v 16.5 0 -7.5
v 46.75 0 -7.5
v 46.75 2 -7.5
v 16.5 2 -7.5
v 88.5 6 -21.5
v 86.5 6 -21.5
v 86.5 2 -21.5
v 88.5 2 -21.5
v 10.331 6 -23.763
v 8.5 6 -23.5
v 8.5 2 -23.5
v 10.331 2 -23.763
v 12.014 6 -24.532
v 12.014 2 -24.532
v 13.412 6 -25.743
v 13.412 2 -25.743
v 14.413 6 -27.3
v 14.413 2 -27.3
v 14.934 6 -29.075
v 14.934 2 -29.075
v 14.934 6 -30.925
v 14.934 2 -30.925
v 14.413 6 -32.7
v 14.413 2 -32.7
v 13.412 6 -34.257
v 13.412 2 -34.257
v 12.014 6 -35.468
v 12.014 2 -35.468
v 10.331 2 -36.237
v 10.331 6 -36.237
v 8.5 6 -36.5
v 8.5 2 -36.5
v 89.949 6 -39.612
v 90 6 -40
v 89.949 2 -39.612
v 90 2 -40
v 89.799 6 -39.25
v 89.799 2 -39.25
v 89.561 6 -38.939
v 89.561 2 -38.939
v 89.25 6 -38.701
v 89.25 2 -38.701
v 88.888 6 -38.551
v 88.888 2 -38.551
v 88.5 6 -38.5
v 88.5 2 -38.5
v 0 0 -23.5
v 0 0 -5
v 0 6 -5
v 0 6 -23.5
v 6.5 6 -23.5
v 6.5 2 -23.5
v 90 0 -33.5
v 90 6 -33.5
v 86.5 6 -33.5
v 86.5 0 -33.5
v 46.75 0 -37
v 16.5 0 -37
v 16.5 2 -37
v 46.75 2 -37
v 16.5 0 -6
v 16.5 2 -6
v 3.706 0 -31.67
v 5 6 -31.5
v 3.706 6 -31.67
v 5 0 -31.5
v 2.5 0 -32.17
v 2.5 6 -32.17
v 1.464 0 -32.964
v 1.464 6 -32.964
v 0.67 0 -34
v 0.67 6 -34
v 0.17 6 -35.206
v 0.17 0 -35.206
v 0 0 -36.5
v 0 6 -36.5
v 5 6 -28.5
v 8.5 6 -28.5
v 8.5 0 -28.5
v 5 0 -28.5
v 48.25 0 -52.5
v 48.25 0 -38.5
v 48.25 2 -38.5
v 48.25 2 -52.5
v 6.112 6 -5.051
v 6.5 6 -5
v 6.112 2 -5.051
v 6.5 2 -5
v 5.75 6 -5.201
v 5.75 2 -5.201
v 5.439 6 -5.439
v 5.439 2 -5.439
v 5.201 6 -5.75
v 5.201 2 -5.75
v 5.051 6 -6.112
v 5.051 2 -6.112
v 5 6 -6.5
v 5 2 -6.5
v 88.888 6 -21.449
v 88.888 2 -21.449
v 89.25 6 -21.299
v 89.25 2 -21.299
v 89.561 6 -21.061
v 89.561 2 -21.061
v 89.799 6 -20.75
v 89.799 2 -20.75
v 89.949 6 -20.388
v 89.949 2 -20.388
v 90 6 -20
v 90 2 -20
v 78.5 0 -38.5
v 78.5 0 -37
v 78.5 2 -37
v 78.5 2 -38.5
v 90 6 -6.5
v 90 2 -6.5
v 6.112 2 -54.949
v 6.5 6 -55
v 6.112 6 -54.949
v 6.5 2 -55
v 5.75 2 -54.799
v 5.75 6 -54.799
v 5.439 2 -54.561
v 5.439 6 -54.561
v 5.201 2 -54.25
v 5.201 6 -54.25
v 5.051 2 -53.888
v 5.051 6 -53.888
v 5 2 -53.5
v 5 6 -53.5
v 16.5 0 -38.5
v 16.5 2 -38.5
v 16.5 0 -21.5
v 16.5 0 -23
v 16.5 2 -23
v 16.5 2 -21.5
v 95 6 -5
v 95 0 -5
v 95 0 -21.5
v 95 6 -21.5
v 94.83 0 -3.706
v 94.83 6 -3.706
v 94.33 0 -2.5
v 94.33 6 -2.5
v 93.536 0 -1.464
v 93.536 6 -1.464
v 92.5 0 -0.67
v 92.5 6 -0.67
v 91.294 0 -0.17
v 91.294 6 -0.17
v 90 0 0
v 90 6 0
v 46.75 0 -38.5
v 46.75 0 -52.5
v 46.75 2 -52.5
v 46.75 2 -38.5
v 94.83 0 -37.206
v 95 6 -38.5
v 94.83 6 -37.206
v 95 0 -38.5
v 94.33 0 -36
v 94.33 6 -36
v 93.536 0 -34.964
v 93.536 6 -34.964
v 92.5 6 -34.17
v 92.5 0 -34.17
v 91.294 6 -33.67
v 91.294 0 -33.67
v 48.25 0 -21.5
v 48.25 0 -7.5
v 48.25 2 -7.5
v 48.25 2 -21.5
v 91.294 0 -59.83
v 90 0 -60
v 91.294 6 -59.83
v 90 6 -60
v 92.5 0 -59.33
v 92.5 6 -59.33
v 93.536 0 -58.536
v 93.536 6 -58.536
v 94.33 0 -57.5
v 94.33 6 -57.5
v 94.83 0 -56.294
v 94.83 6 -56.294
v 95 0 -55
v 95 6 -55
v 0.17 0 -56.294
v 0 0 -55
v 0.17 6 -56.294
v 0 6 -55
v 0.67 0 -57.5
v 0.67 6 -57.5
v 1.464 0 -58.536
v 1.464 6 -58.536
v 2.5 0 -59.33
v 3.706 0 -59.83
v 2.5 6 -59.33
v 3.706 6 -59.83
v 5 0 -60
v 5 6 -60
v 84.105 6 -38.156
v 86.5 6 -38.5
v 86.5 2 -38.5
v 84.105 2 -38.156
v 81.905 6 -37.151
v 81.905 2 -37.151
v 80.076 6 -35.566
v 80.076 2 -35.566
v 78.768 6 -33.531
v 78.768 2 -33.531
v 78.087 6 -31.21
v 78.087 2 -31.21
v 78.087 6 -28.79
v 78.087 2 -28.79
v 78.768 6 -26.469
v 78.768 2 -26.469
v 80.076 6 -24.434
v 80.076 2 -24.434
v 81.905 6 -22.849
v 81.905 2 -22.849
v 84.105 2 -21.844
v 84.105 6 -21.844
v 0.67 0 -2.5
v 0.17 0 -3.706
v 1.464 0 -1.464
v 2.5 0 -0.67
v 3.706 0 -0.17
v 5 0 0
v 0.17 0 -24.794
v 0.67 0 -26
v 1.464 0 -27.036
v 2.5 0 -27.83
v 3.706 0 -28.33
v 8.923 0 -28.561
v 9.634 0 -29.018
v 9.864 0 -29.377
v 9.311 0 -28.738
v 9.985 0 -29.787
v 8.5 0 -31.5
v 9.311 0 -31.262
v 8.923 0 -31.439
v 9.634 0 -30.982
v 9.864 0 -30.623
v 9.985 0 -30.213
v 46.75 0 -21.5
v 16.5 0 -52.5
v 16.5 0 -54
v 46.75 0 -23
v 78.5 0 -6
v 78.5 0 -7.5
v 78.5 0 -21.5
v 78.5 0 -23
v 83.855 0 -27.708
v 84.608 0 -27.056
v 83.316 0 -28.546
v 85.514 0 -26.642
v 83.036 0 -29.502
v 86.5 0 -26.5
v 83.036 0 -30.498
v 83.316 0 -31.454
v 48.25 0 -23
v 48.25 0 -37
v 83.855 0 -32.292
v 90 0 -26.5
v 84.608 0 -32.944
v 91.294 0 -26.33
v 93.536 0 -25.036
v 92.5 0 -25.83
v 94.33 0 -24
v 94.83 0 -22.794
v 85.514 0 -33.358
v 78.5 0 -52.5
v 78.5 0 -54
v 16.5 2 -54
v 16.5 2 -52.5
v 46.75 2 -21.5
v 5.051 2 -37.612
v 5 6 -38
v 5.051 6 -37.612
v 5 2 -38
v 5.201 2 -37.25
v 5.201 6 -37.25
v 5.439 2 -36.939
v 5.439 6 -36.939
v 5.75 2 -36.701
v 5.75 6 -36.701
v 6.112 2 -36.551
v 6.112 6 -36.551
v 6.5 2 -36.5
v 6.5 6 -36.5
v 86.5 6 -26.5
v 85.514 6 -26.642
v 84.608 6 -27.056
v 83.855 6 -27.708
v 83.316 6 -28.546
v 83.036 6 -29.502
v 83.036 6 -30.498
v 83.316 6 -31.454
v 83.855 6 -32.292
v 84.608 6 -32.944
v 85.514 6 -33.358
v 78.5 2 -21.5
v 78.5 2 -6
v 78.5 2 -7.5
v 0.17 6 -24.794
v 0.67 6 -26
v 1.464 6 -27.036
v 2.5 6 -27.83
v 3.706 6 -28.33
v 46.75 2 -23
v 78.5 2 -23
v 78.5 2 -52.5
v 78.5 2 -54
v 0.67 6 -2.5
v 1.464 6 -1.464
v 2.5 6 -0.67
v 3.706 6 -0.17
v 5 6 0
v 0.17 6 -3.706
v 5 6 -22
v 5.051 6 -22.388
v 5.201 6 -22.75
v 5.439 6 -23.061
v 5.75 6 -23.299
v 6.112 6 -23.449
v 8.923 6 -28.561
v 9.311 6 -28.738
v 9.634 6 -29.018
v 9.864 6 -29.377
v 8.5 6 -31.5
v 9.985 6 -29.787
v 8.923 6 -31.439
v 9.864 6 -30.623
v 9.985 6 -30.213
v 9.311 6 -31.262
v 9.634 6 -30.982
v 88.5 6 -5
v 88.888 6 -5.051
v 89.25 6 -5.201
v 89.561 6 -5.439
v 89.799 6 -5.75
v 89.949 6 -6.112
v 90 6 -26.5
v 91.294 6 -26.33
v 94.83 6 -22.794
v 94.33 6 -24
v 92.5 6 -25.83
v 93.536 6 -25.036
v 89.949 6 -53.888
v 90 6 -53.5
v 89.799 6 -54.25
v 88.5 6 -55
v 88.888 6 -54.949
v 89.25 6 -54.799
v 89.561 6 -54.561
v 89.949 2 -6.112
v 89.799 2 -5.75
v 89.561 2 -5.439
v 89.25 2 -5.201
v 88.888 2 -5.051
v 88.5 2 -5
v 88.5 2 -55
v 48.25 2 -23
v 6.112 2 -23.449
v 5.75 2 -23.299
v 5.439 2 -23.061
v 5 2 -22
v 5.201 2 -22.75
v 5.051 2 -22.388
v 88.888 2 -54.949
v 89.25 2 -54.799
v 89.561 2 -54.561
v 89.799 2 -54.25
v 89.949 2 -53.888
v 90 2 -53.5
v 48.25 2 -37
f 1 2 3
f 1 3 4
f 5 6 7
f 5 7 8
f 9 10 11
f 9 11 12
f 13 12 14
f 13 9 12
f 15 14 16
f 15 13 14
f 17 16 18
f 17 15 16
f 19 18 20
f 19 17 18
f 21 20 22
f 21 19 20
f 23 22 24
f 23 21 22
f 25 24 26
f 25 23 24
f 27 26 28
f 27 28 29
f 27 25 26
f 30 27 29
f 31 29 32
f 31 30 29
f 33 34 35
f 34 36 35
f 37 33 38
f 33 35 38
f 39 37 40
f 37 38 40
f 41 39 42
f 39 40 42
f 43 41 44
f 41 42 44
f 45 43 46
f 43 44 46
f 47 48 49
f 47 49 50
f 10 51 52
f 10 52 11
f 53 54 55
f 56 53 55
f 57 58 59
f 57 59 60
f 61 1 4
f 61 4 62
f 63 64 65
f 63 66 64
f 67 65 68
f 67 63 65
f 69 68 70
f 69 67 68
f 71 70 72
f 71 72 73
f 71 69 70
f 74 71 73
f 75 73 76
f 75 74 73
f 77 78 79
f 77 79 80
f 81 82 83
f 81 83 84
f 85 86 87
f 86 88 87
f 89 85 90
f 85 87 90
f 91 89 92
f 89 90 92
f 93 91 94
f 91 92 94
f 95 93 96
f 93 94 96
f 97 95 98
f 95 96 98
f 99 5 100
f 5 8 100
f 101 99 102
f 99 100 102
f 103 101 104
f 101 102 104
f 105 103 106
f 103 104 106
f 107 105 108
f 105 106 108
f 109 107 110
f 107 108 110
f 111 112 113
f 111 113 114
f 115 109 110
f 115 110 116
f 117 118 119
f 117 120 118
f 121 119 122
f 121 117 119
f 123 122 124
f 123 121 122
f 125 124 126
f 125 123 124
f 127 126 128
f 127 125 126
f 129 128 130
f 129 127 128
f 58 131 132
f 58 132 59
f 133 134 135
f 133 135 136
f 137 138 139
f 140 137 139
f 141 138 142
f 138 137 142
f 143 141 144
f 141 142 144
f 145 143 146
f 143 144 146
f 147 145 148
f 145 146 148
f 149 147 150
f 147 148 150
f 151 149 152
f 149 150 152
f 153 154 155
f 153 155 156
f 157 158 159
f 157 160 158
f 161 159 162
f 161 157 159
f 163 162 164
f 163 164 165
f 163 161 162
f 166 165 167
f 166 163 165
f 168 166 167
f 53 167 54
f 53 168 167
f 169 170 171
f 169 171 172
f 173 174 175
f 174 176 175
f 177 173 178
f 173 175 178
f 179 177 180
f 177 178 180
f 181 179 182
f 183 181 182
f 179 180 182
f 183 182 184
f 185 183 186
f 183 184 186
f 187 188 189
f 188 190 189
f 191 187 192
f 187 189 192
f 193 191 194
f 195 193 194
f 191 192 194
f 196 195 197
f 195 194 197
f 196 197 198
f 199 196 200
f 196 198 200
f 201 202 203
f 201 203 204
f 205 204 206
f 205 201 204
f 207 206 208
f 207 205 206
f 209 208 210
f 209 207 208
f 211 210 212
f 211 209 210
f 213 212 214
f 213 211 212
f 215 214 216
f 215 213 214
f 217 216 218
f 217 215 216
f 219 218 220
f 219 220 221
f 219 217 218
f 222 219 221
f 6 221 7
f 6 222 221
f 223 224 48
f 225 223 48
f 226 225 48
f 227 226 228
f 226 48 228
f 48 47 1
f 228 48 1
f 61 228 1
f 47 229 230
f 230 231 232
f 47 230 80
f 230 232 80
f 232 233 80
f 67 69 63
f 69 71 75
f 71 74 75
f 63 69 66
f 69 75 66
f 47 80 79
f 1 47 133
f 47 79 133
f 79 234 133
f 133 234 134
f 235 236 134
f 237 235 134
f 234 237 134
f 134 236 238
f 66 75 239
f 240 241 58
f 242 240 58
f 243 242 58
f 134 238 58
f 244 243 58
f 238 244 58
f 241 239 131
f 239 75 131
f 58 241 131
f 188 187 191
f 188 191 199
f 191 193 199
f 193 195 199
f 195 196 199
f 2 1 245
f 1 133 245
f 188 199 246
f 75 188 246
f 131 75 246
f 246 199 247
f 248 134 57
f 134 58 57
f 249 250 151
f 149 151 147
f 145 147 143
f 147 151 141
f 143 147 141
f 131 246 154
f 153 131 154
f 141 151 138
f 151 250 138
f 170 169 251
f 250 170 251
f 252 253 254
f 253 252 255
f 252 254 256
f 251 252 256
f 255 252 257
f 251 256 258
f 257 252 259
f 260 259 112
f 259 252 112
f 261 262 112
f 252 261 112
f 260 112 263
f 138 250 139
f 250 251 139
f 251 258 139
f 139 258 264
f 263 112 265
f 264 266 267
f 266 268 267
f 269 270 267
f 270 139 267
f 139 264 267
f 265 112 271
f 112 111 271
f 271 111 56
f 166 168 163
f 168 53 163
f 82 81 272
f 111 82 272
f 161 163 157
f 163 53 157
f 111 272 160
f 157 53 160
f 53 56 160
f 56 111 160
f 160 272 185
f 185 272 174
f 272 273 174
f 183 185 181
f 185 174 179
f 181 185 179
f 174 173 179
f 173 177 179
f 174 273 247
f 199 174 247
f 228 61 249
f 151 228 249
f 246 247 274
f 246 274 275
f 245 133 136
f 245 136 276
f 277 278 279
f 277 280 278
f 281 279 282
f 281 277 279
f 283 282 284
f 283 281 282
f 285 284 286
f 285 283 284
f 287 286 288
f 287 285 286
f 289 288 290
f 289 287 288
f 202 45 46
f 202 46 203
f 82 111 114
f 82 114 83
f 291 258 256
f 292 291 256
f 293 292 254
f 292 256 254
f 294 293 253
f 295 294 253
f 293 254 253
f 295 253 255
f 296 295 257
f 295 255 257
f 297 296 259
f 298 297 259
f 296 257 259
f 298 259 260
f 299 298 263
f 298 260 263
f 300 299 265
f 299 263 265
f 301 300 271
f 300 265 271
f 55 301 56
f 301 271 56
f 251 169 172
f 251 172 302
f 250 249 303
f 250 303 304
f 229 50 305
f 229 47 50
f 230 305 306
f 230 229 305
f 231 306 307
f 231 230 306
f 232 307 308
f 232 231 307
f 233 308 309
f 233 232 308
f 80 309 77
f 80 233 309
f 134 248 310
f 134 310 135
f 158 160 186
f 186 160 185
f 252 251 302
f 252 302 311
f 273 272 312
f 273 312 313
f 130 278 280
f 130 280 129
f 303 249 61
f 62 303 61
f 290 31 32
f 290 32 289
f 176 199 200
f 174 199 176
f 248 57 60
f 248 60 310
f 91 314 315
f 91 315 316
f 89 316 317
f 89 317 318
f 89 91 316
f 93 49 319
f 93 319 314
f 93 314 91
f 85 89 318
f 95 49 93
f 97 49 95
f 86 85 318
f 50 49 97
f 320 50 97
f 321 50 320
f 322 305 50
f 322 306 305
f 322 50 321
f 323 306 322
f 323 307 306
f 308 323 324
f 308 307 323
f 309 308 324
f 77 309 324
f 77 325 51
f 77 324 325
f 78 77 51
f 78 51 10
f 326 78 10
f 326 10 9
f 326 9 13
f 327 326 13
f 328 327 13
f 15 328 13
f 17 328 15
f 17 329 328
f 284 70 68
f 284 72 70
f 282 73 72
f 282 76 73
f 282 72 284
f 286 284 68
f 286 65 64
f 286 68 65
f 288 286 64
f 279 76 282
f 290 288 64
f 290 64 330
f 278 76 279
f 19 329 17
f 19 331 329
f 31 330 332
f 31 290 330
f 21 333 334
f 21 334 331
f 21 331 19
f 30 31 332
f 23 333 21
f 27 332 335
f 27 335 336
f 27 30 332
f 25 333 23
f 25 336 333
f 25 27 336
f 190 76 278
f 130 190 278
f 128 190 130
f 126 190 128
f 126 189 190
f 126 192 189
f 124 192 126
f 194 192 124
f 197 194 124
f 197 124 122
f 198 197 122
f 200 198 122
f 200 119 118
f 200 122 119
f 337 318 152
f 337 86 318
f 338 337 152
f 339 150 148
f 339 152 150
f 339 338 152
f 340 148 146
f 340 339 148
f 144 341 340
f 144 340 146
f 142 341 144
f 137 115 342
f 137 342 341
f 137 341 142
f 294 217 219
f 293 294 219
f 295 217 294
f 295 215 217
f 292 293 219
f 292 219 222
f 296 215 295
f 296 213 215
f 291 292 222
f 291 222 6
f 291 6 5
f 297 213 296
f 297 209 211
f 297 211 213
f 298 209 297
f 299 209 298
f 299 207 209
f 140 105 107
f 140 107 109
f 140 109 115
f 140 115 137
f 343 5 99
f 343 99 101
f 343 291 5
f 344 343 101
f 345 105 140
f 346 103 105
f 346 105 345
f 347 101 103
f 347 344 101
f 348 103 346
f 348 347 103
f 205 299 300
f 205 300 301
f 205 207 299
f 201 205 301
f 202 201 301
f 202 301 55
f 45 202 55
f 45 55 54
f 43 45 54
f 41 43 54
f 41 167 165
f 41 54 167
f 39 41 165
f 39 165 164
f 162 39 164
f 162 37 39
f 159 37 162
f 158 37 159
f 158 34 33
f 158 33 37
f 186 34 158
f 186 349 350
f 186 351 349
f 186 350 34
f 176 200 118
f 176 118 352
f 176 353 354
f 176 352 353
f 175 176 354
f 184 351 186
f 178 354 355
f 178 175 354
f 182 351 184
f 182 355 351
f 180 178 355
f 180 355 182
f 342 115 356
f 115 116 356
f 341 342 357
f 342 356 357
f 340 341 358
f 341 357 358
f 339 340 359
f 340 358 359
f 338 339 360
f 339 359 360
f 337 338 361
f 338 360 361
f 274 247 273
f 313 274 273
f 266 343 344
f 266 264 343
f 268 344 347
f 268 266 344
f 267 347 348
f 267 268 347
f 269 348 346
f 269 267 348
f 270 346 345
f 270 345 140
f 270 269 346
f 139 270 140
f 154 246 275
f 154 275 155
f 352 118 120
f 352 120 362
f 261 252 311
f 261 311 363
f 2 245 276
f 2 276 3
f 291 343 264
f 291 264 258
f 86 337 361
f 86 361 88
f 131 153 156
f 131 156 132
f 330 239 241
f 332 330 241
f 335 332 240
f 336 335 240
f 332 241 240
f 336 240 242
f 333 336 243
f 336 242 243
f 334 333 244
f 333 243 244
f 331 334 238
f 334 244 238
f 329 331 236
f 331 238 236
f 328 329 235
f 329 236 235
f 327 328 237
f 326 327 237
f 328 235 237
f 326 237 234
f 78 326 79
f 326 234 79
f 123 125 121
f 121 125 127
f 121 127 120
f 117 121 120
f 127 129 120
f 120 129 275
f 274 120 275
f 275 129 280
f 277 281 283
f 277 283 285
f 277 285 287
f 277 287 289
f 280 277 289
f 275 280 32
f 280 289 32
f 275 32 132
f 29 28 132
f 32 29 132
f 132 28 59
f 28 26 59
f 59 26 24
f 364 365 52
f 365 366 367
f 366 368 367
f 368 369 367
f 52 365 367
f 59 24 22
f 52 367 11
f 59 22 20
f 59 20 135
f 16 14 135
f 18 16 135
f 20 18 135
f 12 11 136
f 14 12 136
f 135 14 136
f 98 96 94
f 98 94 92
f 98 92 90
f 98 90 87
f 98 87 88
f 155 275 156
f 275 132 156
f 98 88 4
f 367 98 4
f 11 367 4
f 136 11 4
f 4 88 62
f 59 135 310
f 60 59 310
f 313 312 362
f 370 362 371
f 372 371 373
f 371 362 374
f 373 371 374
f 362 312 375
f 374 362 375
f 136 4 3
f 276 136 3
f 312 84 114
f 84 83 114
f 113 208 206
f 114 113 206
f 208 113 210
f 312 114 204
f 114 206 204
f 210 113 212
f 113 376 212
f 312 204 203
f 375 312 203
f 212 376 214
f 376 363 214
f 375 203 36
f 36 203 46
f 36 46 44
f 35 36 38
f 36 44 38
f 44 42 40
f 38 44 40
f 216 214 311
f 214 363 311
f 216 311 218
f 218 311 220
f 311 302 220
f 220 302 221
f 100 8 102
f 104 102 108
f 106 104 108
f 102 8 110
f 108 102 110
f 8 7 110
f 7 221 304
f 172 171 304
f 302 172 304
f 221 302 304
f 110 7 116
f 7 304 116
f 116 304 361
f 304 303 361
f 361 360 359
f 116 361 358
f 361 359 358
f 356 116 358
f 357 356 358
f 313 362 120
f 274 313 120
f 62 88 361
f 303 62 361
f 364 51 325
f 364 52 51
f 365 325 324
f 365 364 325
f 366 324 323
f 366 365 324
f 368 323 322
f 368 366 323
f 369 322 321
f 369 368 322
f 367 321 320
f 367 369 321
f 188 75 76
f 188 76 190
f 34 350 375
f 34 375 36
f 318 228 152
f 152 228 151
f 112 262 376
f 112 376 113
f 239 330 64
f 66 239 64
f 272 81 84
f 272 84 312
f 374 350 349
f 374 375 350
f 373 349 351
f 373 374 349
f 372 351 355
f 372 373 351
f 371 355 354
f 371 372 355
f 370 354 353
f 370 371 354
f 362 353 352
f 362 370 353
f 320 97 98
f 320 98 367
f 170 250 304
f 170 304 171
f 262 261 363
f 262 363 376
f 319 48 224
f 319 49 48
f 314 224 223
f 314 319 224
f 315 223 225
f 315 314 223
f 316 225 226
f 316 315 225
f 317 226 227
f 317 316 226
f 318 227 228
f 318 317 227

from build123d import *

# Parameters (mm, degrees)
SKETCH1_W           = 95
SKETCH1_H           = 60
BOSS_EXTRUDE1_DEPTH = 6
SKETCH6_R           = 3.5
SKETCH6_R_2         = 1.5
CUT_EXTRUDE3_DEPTH  = 113.521109131
CUT_EXTRUDE1_DEPTH  = 4
CUT_EXTRUDE2_DEPTH  = 113.521109131
FILLET3_R           = 1.5
SKETCH7_W           = 8.5
SKETCH7_H           = 3
SKETCH7_H_2         = 7
CUT_EXTRUDE4_DEPTH  = 113.521109131
FILLET4_R           = 5
FILLET5_R           = 1.5


with BuildPart() as part:
    # Sketch1 → Boss-Extrude1 (new body)
    with BuildSketch(Plane(origin=(0, 0, 0), x_dir=(1, 0, 0), z_dir=(0, 1, 0))):
        with Locations((47.5, 30)):
            Rectangle(SKETCH1_W, SKETCH1_H)
    extrude(amount=BOSS_EXTRUDE1_DEPTH)

    # Sketch6 → Cut-Extrude3 (cut, through all)
    with BuildSketch(Plane.XZ):
        with Locations(Location((86.5, -30, 0), (0, 0, 270))):
            Circle(SKETCH6_R)
        with Locations(Location((8.5, -30, 0), (0, 0, 270))):
            Circle(SKETCH6_R_2)
    extrude(amount=-CUT_EXTRUDE3_DEPTH, mode=Mode.SUBTRACT)

    # Sketch2 → Cut-Extrude1 (cut)
    with BuildSketch(Plane(origin=(0, 6, 0), x_dir=(-1, 0, 0), z_dir=(0, 1, 0))):
        with BuildLine():
            Line((-8.5, -36.5), (-5, -36.5))
            Line((-5, -36.5), (-5, -55))
            Line((-5, -55), (-90, -55))
            Line((-90, -55), (-90, -38.5))
            Line((-90, -38.5), (-86.5, -38.5))
            ThreePointArc((-86.5, -38.5), (-78, -30), (-86.5, -21.5))
            Line((-86.5, -21.5), (-90, -21.5))
            Line((-90, -21.5), (-90, -5))
            Line((-90, -5), (-5, -5))
            Line((-5, -5), (-5, -23.5))
            Line((-5, -23.5), (-8.5, -23.5))
            ThreePointArc((-8.5, -23.5), (-15, -30), (-8.5, -36.5))
        make_face()
    extrude(amount=-CUT_EXTRUDE1_DEPTH, mode=Mode.SUBTRACT)

    # Sketch5 → Cut-Extrude2 (cut, through all)
    with BuildSketch(Plane.XZ):
        Polygon((46.75, -37), (46.75, -23), (16.5, -23), (16.5, -21.5), (46.75, -21.5), (46.75, -7.5), (16.5, -7.5), (16.5, -6), (47.5, -6), (78.5, -6), (78.5, -7.5), (48.25, -7.5), (48.25, -21.5), (78.5, -21.5), (78.5, -23), (48.25, -23), (48.25, -37), (78.5, -37), (78.5, -38.5), (48.25, -38.5), (48.25, -52.5), (78.5, -52.5), (78.5, -54), (47.5, -54), (16.5, -54), (16.5, -52.5), (46.75, -52.5), (46.75, -38.5), (16.5, -38.5), (16.5, -37), align=None)
    extrude(amount=-CUT_EXTRUDE2_DEPTH, mode=Mode.SUBTRACT)

    # Fillet3
    fillet3_edges = [part.edges().sort_by_distance(p)[0] for p in [
        (90, 4, -55),
    ]]
    fillet(fillet3_edges, radius=FILLET3_R)

    # Sketch7 → Cut-Extrude4 (cut, through all)
    with BuildSketch(Plane(origin=(0, 6, 0), x_dir=(-1, 0, 0), z_dir=(0, 1, 0))):
        with Locations((-4.25, -30)):
            Rectangle(SKETCH7_W, SKETCH7_H)
        with Locations((-90.75, -30)):
            Rectangle(SKETCH7_W, SKETCH7_H_2)
    extrude(amount=-CUT_EXTRUDE4_DEPTH, mode=Mode.SUBTRACT)

    # Fillet4
    fillet4_edges = [part.edges().sort_by_distance(p)[0] for p in [
        (0, 3, -28.5),
        (0, 3, -31.5),
        (95, 3, -33.5),
        (95, 3, -26.5),
        (0, 3, -60),
        (95, 3, -60),
        (95, 3, 0),
        (0, 3, 0),
    ]]
    fillet(fillet4_edges, radius=FILLET4_R)

    # Fillet5
    fillet5_edges = [part.edges().sort_by_distance(p)[0] for p in [
        (5, 4, -5),
        (5, 4, -23.5),
        (5, 4, -36.5),
        (5, 4, -55),
        (90, 4, -38.5),
        (90, 4, -21.5),
        (90, 4, -5),
    ]]
    fillet(fillet5_edges, radius=FILLET5_R)


solid = part.part
